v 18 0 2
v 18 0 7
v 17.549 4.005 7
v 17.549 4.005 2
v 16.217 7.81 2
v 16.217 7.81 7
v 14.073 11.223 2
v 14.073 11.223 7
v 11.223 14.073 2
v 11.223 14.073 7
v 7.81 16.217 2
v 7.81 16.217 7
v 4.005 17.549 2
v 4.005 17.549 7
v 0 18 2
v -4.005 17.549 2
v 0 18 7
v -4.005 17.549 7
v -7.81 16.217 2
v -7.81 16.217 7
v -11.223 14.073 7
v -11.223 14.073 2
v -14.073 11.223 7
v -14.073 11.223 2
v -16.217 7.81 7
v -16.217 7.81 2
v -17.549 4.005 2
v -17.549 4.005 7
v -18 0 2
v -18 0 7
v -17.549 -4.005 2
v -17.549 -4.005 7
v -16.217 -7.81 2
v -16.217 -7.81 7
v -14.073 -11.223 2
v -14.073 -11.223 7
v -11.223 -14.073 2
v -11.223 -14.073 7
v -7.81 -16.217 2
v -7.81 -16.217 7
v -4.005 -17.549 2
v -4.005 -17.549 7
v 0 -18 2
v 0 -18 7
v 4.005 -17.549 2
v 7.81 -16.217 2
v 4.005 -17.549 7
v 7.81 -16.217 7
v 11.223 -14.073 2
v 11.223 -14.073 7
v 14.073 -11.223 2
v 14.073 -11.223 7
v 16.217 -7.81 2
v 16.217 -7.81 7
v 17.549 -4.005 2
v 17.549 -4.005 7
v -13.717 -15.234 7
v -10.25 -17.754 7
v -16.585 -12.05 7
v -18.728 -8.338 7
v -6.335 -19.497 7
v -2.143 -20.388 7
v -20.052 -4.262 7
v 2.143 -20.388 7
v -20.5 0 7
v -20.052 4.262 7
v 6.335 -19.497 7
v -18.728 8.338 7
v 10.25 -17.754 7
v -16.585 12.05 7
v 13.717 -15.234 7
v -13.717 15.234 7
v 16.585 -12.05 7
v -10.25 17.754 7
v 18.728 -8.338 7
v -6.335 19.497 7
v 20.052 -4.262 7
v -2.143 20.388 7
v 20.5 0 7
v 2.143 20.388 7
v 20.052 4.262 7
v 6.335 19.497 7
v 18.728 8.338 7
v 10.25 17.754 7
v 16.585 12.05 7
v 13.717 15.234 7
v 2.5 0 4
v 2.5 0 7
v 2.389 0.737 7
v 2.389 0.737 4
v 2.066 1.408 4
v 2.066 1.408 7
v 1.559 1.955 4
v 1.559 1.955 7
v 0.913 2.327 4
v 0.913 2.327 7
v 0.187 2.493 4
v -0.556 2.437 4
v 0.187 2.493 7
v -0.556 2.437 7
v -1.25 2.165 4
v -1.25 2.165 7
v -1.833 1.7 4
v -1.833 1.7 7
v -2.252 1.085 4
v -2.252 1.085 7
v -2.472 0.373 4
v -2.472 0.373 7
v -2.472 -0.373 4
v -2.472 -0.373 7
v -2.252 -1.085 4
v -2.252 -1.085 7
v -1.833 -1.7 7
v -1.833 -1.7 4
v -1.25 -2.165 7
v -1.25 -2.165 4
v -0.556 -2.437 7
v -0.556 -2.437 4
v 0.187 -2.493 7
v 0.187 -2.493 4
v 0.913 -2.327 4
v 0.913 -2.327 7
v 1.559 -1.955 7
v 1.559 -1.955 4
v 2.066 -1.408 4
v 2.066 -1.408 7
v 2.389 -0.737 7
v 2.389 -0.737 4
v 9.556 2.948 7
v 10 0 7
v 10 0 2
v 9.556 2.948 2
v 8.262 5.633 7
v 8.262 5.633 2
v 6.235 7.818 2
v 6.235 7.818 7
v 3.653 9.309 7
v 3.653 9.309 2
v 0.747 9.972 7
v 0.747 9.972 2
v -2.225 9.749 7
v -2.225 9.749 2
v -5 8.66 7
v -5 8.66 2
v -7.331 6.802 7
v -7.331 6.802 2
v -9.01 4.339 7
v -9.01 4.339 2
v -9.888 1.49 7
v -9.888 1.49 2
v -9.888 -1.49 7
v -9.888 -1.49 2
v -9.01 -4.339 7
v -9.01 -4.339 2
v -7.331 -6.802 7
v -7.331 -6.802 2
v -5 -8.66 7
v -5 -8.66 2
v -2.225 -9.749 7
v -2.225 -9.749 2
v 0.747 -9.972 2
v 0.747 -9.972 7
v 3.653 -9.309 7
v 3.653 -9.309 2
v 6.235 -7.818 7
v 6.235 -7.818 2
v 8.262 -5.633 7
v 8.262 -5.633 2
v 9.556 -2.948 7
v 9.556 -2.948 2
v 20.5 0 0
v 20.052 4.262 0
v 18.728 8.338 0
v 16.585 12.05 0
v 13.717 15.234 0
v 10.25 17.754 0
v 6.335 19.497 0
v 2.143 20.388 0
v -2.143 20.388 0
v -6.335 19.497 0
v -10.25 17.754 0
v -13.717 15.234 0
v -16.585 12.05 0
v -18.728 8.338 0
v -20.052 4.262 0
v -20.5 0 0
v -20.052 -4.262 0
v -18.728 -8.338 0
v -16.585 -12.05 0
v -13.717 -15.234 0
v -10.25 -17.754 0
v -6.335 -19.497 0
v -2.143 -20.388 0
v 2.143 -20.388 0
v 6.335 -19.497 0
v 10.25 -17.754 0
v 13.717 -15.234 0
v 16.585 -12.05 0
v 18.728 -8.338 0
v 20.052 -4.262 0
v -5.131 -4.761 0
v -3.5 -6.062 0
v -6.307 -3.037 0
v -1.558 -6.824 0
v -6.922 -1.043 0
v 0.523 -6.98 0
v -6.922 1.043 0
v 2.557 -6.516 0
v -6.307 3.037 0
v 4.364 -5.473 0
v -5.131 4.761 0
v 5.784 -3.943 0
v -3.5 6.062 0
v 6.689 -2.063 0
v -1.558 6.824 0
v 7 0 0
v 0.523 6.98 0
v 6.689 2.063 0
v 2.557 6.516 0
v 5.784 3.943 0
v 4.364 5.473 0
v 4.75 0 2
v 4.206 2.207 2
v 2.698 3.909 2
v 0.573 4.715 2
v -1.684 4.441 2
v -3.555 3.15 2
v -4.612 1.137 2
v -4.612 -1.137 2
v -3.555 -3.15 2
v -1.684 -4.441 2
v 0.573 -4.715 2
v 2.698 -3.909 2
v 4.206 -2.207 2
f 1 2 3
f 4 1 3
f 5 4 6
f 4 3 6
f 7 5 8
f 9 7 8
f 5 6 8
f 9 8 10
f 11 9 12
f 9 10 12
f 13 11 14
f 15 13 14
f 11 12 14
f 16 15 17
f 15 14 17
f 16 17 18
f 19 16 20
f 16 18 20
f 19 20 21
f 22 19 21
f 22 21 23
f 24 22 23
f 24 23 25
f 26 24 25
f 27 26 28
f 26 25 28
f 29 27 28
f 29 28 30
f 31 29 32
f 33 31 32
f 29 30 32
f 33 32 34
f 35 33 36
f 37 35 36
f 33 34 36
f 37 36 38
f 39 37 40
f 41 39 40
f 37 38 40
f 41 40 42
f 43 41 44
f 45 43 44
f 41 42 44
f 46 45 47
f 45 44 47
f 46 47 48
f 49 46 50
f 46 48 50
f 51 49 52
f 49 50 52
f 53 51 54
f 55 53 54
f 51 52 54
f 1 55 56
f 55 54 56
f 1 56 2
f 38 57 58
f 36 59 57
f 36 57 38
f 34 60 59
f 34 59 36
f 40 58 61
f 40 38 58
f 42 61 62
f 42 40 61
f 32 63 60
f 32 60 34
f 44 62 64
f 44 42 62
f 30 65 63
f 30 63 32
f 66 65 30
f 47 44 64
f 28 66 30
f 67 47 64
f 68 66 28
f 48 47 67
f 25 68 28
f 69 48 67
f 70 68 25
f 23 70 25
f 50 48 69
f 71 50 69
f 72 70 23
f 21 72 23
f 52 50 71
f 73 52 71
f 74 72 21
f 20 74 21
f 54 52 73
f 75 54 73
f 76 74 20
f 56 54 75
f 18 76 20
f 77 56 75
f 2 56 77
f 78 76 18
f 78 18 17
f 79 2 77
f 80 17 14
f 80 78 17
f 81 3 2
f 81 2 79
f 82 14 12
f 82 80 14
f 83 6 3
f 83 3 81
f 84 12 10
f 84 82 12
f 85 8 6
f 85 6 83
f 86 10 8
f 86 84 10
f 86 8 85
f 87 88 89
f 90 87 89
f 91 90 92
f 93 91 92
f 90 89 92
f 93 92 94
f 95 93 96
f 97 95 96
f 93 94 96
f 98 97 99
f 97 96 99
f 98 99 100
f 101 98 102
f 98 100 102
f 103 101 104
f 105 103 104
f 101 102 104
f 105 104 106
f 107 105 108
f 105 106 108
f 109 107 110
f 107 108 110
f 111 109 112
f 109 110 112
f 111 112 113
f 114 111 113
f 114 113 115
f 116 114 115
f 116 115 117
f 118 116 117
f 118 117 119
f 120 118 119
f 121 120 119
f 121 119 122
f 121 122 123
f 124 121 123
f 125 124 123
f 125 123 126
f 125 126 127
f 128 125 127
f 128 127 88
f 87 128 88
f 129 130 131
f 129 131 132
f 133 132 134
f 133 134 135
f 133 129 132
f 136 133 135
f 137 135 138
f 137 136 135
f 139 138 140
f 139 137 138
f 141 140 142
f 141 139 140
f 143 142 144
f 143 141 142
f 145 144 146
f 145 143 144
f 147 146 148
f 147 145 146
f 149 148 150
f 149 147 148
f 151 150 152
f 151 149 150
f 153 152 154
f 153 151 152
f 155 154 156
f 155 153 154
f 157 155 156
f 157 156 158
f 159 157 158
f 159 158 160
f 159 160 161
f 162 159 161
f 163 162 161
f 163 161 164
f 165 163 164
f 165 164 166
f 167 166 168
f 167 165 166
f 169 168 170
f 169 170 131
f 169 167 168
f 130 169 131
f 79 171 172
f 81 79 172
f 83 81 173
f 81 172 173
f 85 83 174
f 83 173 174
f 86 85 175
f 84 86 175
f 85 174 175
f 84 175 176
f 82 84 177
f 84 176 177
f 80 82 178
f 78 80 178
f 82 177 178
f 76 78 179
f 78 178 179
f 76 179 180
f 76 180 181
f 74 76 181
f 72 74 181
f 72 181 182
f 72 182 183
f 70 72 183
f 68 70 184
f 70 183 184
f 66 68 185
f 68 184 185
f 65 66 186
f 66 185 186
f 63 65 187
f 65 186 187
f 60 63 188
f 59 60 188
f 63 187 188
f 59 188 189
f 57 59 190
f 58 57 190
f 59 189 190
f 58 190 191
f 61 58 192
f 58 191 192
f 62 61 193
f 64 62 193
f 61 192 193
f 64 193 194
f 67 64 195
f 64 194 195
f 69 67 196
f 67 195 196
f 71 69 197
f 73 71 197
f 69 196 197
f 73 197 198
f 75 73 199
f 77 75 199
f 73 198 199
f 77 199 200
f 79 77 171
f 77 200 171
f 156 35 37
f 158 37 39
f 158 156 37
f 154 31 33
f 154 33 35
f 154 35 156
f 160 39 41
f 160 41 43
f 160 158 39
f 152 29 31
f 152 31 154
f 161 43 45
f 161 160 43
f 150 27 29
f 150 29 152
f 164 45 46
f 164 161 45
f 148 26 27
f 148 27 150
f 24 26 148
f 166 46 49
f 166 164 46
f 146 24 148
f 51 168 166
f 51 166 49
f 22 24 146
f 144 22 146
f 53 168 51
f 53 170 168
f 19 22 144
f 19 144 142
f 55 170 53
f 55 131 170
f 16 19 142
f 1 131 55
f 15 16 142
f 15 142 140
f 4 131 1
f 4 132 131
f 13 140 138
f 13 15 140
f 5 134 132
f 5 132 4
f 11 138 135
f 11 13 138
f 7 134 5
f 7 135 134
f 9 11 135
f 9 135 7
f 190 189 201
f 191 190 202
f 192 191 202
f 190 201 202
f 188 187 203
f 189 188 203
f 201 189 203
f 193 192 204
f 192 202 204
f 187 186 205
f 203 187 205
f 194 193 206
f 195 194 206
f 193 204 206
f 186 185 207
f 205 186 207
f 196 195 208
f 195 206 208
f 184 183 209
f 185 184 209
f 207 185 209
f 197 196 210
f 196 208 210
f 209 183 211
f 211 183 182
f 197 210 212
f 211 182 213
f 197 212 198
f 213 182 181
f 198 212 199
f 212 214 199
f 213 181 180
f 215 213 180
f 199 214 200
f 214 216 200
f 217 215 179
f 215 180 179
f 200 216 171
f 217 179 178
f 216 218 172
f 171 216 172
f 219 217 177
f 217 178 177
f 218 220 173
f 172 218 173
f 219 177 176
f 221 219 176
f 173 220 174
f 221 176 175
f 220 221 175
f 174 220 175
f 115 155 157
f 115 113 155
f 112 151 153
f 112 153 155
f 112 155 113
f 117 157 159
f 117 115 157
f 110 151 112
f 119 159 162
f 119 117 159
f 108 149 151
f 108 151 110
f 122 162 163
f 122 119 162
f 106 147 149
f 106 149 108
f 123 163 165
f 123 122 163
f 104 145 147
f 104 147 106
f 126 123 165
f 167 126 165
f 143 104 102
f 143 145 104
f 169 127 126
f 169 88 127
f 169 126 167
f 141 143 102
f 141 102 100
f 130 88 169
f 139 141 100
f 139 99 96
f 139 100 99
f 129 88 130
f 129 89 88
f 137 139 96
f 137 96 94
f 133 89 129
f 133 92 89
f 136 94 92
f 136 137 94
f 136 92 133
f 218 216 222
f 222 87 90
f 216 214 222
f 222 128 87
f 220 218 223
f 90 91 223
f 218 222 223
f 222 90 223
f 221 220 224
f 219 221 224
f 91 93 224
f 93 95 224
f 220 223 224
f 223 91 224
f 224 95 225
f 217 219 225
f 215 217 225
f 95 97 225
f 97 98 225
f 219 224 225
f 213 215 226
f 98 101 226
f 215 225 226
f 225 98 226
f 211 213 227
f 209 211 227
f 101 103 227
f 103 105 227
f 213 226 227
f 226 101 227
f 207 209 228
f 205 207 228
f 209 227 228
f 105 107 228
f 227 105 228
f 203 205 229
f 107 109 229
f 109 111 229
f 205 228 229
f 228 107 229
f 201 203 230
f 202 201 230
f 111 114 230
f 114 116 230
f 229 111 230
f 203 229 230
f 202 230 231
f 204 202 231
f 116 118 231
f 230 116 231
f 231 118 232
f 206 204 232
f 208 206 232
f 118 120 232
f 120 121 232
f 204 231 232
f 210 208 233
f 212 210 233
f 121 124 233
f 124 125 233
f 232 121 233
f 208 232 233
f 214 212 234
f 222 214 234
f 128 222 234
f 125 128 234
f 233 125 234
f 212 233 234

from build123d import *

# Parameters (mm, degrees)
F0_R     = 20.5
F1_DEPTH = 7
F2_R     = 18
F2_R_2   = 10
F3_DEPTH = 5
F4_R     = 2.5
F5_DEPTH = 7.001
F6_SIZE2 = 4
F6_SIZE  = 4.5


with BuildPart() as f1:
    # F0 (on Top) → F1 (new body)
    with BuildSketch(Plane.XY):
        Circle(F0_R)
    extrude(amount=F1_DEPTH)

    # F2 (on face) → F3 (cut)
    with BuildSketch(Plane.XY.offset(7)):
        Circle(F2_R)
        Circle(F2_R_2, mode=Mode.SUBTRACT)
    extrude(amount=-F3_DEPTH, mode=Mode.SUBTRACT)

    # F4 (on face) → F5 (cut, through all)
    with BuildSketch(Plane.XY.offset(7)):
        Circle(F4_R)
    extrude(amount=-F5_DEPTH, mode=Mode.SUBTRACT)

    # F6
    f6_edges = [f1.edges().sort_by_distance(p)[0] for p in [
        (-2.5, 0, 0),
    ]]
    chamfer(f6_edges, length=F6_SIZE, length2=F6_SIZE2)


solid = f1.part
